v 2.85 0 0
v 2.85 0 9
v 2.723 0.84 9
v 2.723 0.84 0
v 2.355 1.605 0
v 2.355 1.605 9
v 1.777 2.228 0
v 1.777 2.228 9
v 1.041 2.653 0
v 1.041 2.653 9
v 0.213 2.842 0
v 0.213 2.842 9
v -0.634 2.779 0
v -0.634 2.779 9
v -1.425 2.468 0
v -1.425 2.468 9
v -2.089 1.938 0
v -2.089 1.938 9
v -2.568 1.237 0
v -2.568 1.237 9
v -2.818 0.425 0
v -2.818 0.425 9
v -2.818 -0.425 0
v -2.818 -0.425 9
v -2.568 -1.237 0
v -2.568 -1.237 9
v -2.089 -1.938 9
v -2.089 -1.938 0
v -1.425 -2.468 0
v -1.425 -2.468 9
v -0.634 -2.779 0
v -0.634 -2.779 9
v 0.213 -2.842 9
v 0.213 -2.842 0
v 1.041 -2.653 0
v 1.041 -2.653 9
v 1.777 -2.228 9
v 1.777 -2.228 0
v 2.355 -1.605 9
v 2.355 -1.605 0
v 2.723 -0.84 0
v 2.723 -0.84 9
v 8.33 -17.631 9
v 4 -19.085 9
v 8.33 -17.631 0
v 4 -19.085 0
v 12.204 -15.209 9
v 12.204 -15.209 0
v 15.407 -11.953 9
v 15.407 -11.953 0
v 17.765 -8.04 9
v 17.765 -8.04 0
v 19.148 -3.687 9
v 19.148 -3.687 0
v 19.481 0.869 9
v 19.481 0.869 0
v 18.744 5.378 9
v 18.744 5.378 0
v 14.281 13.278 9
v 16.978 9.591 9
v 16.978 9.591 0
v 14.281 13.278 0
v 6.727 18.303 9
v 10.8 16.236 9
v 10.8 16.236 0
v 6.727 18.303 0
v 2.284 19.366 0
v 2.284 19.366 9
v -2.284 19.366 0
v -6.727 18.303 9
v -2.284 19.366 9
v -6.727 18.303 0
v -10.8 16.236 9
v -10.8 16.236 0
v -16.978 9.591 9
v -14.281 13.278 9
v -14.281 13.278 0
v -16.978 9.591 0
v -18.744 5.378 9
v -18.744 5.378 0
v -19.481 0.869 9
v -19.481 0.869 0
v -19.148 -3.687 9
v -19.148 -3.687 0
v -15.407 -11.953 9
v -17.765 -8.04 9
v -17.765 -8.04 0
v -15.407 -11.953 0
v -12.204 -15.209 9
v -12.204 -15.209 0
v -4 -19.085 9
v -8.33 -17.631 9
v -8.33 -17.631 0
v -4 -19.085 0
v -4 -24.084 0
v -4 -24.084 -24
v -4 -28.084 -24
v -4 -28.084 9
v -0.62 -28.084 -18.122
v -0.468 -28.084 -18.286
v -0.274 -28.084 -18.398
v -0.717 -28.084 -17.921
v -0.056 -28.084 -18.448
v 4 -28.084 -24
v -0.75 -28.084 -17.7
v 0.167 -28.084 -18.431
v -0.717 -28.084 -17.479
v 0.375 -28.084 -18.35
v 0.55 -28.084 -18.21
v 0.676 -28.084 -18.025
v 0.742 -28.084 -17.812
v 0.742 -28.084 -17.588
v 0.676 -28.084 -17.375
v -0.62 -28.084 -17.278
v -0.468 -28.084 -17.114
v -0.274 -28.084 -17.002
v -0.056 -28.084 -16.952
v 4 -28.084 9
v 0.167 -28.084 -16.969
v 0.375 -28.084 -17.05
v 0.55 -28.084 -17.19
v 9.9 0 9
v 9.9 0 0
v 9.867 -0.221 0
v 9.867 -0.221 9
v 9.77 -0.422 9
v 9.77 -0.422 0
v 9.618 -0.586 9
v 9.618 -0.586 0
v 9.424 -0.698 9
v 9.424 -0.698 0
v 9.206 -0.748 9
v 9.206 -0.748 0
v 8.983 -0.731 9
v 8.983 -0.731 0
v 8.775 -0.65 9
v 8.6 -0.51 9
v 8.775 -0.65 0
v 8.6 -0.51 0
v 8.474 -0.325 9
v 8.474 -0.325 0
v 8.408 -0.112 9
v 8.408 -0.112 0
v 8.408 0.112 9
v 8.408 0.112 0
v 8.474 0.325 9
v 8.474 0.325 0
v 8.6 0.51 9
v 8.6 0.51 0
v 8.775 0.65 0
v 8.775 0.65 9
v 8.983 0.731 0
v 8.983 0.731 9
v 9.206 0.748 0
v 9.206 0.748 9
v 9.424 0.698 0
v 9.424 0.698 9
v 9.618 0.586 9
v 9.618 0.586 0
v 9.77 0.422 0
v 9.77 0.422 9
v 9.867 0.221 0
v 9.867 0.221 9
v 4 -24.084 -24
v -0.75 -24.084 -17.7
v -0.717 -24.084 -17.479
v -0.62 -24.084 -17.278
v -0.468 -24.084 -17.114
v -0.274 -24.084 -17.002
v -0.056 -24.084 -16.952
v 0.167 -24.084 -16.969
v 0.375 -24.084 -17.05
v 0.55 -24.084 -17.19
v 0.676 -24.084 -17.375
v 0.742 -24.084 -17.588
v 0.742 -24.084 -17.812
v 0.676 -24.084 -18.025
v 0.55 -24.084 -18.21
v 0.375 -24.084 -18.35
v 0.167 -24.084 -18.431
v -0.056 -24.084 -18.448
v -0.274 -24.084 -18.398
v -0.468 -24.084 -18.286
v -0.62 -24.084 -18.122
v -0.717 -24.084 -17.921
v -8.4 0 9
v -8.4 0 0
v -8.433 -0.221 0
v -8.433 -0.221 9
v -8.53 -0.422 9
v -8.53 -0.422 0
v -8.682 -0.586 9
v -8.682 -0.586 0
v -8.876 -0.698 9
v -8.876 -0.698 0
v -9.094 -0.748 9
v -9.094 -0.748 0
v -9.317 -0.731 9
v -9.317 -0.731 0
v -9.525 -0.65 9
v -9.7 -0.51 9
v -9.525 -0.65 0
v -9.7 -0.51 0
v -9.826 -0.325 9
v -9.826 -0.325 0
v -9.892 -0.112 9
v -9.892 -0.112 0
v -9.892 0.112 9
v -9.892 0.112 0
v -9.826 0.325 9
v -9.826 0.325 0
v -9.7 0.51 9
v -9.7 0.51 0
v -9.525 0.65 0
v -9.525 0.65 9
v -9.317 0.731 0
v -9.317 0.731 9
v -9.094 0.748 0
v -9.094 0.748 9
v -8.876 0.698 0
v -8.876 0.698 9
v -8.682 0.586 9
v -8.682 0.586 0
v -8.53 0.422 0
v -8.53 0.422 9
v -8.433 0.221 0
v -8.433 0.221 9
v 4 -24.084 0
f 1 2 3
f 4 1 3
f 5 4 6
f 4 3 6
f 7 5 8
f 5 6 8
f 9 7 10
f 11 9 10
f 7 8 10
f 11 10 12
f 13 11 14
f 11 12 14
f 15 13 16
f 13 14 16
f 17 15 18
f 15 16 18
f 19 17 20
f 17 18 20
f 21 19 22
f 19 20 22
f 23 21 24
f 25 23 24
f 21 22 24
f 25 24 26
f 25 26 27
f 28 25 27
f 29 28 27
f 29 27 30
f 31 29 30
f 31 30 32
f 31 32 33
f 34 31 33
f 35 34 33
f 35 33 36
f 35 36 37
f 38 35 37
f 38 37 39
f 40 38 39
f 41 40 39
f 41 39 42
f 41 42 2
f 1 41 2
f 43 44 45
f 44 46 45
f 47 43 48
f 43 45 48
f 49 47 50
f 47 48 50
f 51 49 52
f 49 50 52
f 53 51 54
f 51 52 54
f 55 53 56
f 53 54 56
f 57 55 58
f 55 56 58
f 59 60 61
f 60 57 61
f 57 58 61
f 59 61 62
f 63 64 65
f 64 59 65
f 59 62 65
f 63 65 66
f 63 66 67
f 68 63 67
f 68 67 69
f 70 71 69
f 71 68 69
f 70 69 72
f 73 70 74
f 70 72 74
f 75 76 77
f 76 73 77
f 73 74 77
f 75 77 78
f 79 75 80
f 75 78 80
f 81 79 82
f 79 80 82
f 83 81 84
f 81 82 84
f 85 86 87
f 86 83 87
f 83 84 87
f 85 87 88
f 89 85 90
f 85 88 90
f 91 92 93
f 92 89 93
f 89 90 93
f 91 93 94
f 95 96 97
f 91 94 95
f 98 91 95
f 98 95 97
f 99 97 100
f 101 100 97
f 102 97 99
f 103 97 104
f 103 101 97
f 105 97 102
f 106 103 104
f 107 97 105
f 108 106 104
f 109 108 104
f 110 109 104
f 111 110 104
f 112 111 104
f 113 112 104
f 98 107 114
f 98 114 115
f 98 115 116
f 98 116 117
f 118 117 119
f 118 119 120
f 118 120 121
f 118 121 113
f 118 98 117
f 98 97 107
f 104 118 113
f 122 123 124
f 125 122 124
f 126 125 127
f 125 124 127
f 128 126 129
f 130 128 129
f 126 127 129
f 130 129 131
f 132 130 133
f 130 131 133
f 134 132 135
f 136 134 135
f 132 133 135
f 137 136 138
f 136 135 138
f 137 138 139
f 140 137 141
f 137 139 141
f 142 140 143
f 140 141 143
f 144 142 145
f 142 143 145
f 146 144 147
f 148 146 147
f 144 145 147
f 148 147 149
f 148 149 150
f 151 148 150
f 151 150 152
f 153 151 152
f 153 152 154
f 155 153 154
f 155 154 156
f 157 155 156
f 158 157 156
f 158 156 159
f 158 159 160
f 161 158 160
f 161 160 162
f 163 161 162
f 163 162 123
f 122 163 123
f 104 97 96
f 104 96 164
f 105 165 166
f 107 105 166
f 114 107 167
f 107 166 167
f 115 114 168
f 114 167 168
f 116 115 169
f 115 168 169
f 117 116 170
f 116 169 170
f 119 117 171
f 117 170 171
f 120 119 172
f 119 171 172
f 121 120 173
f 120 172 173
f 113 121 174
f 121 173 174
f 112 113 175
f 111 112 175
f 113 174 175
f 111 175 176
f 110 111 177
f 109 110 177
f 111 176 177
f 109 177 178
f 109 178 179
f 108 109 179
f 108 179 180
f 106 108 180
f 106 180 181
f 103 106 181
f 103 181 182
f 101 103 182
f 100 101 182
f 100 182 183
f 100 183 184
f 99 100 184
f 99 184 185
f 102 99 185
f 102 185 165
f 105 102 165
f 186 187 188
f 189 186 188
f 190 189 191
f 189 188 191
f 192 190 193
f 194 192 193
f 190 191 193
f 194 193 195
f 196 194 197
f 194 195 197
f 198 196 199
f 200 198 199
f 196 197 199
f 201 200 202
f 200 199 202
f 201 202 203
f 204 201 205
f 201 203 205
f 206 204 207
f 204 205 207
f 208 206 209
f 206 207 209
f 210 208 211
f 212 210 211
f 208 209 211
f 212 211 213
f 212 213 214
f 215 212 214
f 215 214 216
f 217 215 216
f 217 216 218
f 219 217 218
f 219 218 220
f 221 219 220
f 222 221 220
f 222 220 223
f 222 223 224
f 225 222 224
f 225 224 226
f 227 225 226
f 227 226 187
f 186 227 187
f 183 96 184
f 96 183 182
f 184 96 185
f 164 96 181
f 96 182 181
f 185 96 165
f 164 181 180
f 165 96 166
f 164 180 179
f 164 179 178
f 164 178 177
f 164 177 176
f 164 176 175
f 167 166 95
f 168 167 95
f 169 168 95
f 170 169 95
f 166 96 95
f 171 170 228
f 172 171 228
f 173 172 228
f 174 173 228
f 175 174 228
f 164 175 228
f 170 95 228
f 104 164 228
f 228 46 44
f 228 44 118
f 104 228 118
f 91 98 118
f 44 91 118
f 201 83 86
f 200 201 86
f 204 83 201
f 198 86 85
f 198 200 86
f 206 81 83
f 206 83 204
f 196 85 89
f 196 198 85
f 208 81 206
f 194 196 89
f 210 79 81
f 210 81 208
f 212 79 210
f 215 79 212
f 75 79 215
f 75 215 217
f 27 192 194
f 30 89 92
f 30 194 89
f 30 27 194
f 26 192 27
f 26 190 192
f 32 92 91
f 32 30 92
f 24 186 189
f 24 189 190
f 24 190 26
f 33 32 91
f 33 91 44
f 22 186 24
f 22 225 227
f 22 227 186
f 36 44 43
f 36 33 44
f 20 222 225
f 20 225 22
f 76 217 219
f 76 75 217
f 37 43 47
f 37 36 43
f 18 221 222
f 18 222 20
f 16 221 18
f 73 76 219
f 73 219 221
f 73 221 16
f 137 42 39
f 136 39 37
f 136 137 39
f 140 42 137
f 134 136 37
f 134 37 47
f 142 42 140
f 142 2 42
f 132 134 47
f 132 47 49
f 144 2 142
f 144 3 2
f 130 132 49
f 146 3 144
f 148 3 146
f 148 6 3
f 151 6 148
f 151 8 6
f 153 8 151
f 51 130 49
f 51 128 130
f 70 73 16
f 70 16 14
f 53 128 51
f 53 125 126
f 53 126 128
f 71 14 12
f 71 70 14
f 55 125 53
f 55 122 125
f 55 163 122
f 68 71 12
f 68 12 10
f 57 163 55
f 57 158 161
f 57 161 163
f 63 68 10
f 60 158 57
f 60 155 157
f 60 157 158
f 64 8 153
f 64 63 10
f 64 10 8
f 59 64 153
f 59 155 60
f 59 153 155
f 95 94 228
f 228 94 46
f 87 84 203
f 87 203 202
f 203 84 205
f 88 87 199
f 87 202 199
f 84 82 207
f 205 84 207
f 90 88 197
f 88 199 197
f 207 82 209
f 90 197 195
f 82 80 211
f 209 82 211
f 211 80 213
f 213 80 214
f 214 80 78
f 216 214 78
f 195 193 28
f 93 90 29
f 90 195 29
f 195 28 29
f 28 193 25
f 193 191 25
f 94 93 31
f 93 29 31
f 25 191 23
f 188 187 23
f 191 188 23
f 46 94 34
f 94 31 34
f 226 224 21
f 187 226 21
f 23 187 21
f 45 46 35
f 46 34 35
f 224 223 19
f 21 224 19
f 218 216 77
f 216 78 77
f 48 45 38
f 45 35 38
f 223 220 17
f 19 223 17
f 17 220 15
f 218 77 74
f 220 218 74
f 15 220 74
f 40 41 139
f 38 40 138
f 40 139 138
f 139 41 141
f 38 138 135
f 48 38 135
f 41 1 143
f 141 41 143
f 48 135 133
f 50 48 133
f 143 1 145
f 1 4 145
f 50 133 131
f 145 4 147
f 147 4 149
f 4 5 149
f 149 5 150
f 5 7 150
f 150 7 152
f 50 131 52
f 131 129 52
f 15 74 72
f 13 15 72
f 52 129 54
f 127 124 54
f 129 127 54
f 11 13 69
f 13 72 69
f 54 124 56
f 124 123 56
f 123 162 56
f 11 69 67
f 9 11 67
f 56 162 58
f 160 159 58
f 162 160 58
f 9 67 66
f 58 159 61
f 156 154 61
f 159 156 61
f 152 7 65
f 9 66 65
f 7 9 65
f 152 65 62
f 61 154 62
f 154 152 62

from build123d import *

# Parameters (mm, degrees)
F0_R      = 19.5
F1_DEPTH  = 9
F2_R      = 2.85
F3_DEPTH  = 9.001
F4_W      = 8
F4_H      = 9
F5_DEPTH  = 9
F6_W      = 8
F6_H      = 4
F7_DEPTH  = 24
F8_R      = 0.75
F9_DEPTH  = 9.001
F10_R     = 0.75
F11_DEPTH = 4.001


with BuildPart() as f1:
    # F0 (on Top) → F1 (new body)
    with BuildSketch(Plane.XY):
        Circle(F0_R)
    extrude(amount=F1_DEPTH)

    # F2 (on face) → F3 (cut, through all)
    with BuildSketch(Plane.XY.offset(9)):
        Circle(F2_R)
    extrude(amount=-F3_DEPTH, mode=Mode.SUBTRACT)

    # F4 (on face) → F5 (join)
    with BuildSketch(Plane(origin=(0, 0, 0), x_dir=(1, 0, 0), z_dir=(0, 0, -1))):
        with Locations((0, 23.583922)):
            Rectangle(F4_W, F4_H)
    extrude(amount=-F5_DEPTH)

    # F6 (on face) → F7 (join)
    with BuildSketch(Plane(origin=(0, 0, 0), x_dir=(1, 0, 0), z_dir=(0, 0, -1))):
        with Locations((0, 26.083922)):
            Rectangle(F6_W, F6_H)
    extrude(amount=F7_DEPTH)

    # F8 (on face) → F9 (cut, through all)
    with BuildSketch(Plane(origin=(0, 0, 0), x_dir=(1, 0, 0), z_dir=(0, 0, -1))):
        with Locations((-9.15, 0)):
            Circle(F8_R)
        with Locations((9.15, 0)):
            Circle(F8_R)
    extrude(amount=-F9_DEPTH, mode=Mode.SUBTRACT)

    # F10 (on face) → F11 (cut, through all)
    with BuildSketch(Plane(origin=(0, -24.083922, 0), x_dir=(-1, 0, 0), z_dir=(0, 1, 0))):
        with Locations((0, -17.7)):
            Circle(F10_R)
    extrude(amount=-F11_DEPTH, mode=Mode.SUBTRACT)


solid = f1.part
